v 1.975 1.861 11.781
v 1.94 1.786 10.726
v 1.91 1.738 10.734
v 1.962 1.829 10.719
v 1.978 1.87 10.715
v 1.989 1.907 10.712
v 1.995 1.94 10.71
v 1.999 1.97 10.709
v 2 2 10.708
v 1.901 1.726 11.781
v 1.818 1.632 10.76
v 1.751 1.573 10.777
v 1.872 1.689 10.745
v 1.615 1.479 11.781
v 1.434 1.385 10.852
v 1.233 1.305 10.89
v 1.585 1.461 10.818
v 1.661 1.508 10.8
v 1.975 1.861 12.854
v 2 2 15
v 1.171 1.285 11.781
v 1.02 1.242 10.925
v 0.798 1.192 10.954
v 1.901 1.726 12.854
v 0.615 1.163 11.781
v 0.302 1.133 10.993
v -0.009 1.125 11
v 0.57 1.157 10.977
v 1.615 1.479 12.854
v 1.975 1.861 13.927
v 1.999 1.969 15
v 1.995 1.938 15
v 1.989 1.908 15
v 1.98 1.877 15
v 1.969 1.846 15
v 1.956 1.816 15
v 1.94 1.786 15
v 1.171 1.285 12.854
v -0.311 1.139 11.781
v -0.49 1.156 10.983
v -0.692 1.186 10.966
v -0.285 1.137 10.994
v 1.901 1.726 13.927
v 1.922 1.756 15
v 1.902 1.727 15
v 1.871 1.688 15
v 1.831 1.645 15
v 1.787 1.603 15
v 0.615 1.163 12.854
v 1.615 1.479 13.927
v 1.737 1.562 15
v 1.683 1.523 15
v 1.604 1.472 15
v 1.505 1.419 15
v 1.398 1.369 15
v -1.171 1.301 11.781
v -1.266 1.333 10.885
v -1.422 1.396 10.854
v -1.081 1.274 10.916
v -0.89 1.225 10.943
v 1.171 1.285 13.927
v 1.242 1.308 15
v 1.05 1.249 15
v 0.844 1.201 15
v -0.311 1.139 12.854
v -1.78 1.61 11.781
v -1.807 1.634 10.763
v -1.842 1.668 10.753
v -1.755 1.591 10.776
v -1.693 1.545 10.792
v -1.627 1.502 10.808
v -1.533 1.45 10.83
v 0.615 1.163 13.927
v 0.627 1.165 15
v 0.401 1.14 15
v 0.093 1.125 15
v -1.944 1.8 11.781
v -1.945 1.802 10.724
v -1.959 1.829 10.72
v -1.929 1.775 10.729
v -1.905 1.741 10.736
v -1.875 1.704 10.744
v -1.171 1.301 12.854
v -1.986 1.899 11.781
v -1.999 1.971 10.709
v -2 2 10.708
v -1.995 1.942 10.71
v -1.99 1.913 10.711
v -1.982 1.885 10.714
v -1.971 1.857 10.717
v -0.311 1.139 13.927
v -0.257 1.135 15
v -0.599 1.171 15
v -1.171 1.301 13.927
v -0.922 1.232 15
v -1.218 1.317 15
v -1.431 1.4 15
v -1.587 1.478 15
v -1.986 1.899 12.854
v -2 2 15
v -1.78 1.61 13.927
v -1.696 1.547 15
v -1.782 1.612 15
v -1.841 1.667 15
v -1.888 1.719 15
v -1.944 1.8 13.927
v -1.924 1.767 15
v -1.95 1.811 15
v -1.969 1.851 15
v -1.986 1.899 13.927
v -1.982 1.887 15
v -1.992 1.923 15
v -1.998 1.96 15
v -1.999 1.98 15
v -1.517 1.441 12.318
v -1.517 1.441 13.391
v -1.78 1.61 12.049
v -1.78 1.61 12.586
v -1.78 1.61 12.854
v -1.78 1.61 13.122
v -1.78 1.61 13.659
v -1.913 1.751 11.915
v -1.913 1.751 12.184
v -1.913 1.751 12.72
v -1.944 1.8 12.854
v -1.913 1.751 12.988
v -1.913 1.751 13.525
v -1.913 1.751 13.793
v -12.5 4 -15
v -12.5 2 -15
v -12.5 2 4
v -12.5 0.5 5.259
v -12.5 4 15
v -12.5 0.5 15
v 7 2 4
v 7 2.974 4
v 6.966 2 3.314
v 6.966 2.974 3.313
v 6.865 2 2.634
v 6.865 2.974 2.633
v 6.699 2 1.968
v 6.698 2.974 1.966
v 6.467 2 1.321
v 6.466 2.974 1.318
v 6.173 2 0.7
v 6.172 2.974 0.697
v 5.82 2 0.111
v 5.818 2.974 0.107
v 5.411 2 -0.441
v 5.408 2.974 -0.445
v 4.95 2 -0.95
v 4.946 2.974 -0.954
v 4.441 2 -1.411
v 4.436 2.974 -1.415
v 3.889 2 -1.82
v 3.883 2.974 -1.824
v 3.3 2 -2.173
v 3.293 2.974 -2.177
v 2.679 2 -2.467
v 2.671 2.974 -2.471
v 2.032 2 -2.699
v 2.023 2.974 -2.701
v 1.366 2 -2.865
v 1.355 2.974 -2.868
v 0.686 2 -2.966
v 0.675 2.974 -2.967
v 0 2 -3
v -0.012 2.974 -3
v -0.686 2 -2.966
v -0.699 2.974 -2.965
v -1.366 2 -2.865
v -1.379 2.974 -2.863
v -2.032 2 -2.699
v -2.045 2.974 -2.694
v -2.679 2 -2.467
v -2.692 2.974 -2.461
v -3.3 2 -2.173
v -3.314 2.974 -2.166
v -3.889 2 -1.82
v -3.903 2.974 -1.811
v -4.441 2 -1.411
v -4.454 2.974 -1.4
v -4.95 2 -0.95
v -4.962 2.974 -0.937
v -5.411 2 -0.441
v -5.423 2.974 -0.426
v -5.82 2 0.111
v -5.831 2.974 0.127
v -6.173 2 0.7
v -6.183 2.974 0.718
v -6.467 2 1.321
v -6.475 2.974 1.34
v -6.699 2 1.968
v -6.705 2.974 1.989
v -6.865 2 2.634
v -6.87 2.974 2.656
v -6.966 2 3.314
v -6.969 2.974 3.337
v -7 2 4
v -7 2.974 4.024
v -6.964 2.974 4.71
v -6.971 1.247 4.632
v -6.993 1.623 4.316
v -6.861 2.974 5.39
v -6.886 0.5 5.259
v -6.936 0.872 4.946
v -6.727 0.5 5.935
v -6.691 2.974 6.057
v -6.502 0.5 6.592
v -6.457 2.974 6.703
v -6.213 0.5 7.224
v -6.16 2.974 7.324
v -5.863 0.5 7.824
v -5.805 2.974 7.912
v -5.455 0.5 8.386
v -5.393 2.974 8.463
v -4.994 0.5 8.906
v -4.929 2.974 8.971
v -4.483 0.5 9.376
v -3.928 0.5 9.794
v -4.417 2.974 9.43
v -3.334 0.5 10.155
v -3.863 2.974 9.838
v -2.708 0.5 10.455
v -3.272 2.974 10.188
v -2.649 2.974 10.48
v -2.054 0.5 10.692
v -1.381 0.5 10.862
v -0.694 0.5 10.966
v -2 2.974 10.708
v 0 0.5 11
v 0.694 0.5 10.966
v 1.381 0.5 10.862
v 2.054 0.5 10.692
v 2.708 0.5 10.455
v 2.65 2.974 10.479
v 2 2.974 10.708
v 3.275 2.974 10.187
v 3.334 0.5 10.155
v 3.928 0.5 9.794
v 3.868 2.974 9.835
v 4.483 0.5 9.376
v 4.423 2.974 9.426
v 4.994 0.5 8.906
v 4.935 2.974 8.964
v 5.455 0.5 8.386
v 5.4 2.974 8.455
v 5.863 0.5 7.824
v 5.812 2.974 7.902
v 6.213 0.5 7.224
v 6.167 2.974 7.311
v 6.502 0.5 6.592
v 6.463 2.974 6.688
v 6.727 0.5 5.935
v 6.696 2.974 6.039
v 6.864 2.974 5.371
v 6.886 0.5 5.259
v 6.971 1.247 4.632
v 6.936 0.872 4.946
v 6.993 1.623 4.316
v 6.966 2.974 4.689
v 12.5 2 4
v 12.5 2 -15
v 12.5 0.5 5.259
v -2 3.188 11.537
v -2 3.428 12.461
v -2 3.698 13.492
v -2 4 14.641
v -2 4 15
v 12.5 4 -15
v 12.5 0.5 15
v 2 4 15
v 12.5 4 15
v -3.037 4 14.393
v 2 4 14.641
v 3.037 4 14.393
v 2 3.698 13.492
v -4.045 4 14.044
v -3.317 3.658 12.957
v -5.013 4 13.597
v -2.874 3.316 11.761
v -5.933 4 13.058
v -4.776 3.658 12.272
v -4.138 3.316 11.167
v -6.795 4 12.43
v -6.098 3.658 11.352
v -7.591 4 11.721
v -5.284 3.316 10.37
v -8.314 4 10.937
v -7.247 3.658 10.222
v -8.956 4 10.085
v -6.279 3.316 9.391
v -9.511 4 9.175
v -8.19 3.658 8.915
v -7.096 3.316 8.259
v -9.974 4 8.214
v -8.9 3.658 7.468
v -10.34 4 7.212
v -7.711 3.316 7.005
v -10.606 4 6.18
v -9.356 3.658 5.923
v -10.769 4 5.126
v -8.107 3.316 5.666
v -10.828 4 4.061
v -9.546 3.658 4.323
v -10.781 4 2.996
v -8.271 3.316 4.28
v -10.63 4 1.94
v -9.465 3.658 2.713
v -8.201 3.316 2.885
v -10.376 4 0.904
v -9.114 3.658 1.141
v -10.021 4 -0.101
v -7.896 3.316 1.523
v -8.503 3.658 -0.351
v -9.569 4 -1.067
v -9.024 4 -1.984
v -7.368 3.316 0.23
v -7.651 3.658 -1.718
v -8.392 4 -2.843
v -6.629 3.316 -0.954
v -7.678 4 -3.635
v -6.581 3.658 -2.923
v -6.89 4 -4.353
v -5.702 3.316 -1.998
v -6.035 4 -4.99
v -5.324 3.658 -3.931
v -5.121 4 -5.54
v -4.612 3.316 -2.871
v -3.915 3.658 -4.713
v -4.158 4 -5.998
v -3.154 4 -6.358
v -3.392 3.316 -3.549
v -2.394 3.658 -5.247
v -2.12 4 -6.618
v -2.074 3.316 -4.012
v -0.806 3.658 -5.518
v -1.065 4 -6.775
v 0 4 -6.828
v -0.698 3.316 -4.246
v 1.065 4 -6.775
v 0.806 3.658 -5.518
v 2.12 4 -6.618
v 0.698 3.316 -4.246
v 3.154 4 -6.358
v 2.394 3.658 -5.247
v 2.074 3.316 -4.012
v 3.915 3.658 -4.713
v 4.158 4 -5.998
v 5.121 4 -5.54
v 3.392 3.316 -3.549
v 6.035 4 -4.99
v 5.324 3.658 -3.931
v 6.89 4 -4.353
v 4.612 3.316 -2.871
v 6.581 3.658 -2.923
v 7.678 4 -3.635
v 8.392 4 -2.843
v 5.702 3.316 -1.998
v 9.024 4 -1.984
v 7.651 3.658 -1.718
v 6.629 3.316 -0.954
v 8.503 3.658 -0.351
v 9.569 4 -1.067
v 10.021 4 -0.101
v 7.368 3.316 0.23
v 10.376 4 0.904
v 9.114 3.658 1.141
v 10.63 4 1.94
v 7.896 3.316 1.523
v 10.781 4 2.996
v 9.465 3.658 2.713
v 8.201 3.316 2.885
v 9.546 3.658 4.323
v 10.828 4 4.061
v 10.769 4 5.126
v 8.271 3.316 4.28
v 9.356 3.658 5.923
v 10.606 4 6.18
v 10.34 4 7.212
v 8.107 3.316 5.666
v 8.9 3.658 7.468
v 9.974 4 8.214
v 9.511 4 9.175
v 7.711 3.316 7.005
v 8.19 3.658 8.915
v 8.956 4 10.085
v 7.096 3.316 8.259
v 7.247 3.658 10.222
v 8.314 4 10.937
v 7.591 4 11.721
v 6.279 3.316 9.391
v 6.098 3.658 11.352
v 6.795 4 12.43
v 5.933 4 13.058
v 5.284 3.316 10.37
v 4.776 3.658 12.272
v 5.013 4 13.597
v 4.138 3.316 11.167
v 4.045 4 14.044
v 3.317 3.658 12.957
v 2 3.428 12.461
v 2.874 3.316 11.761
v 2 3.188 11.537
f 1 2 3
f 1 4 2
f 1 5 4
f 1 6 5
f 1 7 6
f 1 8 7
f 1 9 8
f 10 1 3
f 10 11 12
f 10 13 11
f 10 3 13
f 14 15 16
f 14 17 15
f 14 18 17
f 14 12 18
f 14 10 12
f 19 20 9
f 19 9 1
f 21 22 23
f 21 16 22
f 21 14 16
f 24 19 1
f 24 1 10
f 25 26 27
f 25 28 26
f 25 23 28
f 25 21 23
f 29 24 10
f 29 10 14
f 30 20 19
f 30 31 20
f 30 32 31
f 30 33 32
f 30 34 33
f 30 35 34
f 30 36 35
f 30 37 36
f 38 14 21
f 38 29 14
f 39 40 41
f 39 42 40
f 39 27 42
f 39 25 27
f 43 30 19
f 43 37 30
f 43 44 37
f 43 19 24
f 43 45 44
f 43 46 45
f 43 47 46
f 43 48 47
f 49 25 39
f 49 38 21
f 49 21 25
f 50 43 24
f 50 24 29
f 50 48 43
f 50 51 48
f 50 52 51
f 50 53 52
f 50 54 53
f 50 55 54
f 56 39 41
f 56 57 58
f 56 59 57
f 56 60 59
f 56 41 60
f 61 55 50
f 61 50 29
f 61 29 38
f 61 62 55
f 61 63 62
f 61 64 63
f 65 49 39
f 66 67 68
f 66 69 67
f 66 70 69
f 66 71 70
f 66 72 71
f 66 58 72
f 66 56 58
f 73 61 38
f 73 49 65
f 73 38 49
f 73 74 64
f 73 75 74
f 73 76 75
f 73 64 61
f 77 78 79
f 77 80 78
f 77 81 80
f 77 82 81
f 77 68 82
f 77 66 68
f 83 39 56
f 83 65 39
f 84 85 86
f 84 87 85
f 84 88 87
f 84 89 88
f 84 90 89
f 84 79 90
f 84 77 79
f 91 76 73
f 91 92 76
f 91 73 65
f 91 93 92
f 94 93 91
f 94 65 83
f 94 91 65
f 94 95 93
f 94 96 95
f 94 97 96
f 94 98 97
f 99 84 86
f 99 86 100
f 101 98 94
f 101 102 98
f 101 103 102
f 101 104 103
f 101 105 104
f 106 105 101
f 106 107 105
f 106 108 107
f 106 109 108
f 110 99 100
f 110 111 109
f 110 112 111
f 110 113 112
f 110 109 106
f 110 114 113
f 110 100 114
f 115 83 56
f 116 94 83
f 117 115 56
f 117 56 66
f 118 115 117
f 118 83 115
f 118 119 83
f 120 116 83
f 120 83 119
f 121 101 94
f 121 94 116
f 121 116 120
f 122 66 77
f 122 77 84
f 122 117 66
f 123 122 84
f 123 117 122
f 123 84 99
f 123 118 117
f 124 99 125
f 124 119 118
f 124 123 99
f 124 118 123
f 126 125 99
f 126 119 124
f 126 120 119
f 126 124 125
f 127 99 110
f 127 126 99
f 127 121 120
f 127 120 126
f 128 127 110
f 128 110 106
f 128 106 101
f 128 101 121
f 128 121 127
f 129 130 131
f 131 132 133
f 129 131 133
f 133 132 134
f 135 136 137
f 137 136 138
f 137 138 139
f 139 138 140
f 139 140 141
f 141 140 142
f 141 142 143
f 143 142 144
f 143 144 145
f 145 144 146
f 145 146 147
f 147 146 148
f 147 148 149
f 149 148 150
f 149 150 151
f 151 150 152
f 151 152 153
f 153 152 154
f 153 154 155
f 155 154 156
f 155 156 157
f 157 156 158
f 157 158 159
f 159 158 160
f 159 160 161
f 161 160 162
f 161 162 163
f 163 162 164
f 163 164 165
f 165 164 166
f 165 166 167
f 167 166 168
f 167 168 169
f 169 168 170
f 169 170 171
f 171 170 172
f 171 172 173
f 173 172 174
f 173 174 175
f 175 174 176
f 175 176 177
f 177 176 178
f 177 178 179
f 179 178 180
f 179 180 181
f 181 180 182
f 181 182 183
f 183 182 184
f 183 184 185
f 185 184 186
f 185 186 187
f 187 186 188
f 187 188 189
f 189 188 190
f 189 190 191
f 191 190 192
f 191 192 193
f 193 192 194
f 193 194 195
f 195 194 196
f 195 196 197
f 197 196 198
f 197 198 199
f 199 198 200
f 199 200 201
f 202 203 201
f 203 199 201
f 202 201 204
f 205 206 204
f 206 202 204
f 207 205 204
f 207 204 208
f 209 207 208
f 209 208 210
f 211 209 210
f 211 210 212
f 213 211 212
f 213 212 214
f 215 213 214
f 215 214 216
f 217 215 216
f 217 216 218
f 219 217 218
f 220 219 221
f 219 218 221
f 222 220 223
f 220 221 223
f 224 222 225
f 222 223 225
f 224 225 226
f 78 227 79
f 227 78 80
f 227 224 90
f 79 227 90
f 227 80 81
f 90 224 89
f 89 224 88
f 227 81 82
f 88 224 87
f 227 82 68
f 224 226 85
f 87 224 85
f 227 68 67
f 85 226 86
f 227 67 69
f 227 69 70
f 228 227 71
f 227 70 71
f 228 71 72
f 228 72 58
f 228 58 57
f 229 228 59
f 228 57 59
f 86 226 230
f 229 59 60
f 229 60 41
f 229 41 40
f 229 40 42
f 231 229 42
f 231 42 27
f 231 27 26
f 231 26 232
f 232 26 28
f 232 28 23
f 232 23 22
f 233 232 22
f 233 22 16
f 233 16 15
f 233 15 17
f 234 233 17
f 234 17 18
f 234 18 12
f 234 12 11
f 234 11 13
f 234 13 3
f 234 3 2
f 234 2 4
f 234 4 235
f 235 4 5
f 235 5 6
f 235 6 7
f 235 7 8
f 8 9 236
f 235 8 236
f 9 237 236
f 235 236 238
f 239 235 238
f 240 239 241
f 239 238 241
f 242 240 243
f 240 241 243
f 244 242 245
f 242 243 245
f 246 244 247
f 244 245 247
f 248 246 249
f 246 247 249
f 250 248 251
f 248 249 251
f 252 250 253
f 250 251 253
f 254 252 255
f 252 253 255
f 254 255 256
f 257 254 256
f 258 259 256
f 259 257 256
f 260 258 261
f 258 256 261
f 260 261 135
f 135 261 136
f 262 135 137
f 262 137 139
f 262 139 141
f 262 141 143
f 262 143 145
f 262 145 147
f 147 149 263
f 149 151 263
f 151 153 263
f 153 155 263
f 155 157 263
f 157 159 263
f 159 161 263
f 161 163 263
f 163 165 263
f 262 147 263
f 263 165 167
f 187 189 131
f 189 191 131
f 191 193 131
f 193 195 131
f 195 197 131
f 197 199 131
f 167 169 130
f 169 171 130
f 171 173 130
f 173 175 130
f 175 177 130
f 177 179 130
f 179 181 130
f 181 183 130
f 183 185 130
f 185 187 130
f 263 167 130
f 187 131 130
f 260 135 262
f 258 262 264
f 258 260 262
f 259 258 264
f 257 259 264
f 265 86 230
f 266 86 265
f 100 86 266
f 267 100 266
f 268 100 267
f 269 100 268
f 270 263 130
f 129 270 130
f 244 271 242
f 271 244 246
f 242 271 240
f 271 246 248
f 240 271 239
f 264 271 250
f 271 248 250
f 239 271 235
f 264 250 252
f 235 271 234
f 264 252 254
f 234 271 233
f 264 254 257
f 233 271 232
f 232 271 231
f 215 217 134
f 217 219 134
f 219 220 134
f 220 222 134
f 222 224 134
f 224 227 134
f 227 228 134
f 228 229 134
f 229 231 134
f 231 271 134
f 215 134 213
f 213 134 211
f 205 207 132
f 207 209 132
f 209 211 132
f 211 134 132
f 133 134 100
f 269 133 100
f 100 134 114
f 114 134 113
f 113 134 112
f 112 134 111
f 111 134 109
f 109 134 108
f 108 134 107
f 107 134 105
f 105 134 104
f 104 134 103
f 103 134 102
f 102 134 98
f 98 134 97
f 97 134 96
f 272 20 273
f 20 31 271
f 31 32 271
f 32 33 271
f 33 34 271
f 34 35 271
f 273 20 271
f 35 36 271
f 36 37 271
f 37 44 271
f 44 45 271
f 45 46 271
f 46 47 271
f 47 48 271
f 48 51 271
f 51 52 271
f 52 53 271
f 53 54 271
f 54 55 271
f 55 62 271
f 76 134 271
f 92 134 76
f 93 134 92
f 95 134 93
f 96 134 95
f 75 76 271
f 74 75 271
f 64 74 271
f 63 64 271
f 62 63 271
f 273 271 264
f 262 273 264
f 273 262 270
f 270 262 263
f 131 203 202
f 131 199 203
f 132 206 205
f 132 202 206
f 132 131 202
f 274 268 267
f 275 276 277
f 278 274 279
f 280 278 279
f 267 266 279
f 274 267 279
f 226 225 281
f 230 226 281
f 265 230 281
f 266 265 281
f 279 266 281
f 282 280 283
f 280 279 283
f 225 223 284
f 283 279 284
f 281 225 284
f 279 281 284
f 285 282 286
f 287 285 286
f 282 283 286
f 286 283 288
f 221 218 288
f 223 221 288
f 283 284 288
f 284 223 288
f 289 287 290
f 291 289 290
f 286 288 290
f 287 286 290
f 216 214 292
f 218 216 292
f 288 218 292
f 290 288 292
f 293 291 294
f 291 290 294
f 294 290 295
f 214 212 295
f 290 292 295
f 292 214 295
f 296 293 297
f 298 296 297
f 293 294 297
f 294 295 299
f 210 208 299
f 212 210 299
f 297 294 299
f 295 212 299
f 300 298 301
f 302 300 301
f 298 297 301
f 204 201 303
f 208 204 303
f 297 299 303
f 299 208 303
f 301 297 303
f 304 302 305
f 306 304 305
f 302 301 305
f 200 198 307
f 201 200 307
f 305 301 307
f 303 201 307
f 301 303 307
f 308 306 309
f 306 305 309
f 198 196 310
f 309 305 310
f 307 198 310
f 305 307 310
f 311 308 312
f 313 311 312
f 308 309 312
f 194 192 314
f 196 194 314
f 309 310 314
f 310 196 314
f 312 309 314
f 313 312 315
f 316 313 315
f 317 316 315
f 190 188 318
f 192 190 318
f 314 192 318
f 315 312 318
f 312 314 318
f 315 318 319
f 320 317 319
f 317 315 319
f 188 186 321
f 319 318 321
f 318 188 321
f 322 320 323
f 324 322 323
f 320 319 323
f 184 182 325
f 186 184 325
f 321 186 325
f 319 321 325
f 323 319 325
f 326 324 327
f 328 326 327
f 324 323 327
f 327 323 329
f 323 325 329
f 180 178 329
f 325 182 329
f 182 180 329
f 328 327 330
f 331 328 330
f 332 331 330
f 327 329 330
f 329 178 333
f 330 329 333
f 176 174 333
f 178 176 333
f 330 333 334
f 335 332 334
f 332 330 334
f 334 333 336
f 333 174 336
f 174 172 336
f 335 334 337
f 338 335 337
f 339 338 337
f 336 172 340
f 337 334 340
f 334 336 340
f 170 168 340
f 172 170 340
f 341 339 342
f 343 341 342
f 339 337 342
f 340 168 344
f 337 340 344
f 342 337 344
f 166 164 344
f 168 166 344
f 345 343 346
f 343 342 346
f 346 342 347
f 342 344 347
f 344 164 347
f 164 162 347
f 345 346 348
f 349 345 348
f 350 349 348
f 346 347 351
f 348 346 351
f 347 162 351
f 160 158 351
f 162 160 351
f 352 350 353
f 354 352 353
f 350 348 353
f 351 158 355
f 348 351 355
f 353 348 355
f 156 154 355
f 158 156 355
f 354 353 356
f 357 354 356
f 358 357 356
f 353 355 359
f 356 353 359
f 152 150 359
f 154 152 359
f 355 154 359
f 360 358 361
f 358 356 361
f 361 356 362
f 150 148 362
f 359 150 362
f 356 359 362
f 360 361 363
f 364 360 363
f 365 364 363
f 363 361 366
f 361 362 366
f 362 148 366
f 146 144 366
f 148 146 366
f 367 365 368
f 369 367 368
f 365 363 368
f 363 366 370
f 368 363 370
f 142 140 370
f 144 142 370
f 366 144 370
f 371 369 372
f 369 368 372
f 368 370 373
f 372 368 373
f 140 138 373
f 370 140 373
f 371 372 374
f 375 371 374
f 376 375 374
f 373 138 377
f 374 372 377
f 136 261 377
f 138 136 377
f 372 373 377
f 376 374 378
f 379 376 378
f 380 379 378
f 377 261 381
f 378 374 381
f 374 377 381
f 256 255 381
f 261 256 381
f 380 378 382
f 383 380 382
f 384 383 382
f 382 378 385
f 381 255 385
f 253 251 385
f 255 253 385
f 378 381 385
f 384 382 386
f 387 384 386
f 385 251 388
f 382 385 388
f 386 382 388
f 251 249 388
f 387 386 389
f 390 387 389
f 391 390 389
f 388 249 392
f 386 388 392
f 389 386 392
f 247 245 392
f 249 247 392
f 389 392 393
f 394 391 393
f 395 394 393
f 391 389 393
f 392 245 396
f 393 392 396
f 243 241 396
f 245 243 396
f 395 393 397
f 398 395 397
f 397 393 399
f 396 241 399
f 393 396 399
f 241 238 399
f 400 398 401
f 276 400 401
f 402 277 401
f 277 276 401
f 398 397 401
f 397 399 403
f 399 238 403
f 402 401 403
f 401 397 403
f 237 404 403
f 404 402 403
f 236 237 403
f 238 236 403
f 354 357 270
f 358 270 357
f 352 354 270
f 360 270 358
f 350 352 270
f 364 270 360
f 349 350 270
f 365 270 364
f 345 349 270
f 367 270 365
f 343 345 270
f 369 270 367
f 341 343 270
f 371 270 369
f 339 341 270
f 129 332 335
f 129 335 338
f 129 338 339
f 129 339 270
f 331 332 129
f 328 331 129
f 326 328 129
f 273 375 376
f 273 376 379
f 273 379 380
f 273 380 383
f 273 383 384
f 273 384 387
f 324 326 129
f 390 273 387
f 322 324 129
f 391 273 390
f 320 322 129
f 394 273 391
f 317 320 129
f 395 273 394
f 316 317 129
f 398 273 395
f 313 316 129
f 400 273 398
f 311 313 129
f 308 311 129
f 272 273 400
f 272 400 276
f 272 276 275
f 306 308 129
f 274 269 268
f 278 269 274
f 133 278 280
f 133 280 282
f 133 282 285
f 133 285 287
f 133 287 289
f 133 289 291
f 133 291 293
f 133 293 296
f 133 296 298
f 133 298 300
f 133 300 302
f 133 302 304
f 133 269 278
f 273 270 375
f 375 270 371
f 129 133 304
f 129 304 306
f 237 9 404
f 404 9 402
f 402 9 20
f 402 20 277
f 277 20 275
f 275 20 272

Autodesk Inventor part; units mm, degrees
ref_plane "YZ Plane" through (0, 0, 0) normal (1, 0, 0) x (0, 1, 0)
ref_plane "XZ Plane" through (0, 0, 0) normal (0, 1, 0) x (-1, 0, 0)
ref_plane "XY Plane" through (0, 0, 0) normal (0, 0, 1) x (1, 0, 0)
sketch "Sketch1" plane through (0, 0, 0) normal (0, 1, 0) x (-1, 0, 0)
  line L0 (12.5, 15) -> (-12.5, 15)
  line L1 (-12.5, 15) -> (-12.5, -15)
  line L2 (-12.5, -15) -> (12.5, -15)
  line L3 (12.5, -15) -> (12.5, 15)
  line L4 (12.5, 15) -> (-12.5, -15) construction
  line L5 (-12.5, 15) -> (12.5, -15) construction
  point P0 (0, 0)
  dimension "d0" = 25
  dimension "d1" = 30
extrude "Extrusion1" add sketch "Sketch1" along normal blind 4
sketch "Sketch2" plane through (0, 4, 0) normal (0, 1, 0) x (1, 0, 0)
  line L0 (-12.5, 15) -> (-12.5, -15) construction
  line L1 (-12.5, -11) -> (12.5, -11) construction
  line L2 (12.5, -15) -> (12.5, 15) construction
  line L3 (-12.5, -15) -> (12.5, -15) construction
  circle A0 centre (0, -4) radius 7
  line L4 (0, -15) -> (0, 15) construction
  line L5 (12.5, 15) -> (-12.5, 15) construction
  point P0 (0, 0)
  point P1 (0, -11)
  dimension "d5" = 14
  dimension "d4" = 4
extrude "Extrusion2" cut sketch "Sketch2" against normal through all
sketch "Sketch3" plane through (0, 0, 0) normal (1, 0, 0) x (0, 1, 0)
  line L0 (4, -3) -> (4, 11) construction
  line L1 (0, -15) -> (0, 15) construction
  line L2 (0, 15) -> (4, 15) construction
  line L3 (4, -15) -> (4, 15) construction
  line L4 (0, -15) -> (4, -15) construction
  line L5 (4, 4) -> (0, 4) construction
  line L6 (2, 4) -> (0.5, 5.258649)
  line L7 (2, 4) -> (2, -15)
  line L8 (0, -15) -> (4, -15)
  line L9 (2, -15) -> (1.618278, -15)
  line L10 (0.5, 15) -> (0.5, 5.258649)
  line L11 (1.618278, -15) -> (0, -15)
  line L12 (0, -15) -> (0, 15)
  line L13 (0, 15) -> (0.5, 15)
  line L14 (0, 15) -> (4, 15)
  line L15 (4, 11) -> (0, 11)
  line L16 (4, -3) -> (0, -3)
  point P0 (0, 0)
  dimension "d6" = 50
  dimension "d7" = 2
  dimension "d8" = 1.5
extrude "Extrusion3" cut sketch "Sketch3" along normal through all both and the other way through all
sketch "Sketch7" plane through (-12.5, 4, 15) normal (0, 0, 1) x (1, 0, 0)
  line L0 (0, -3.5) -> (25, -3.5) construction
  line L1 (25, -3.5) -> (25, 0) construction
  line L2 (0, 0) -> (25, 0) construction
  line L3 (0, -3.5) -> (0, 0) construction
  line L4 (5.5, -2) -> (19.5, -2) construction
  circle A0 centre (12.5, -2) radius 0.875 construction
  line L5 (12.5, -2) -> (14.5, -2) construction
  line L6 (12.5, 0) -> (12.5, -3.5) construction
  line L7 (12.5, -2) -> (10.5, -2) construction
  spline S0 degree 5 poles (10.5, -2) (10.5, -1.67732) (11.1, -1.13952) (13.34, -0.733036) (15.98, -2) (13.34, -3.266964) (11.1, -2.86048) (10.5, -2.32268) (10.5, -2) knots 0 0 0 0 0 0 0.3 0.5 0.7 1 1 1 1 1 1
  line L8 (10.5, -2) -> (10.5, 0)
  line L9 (14.5, -2) -> (14.5, 0)
  line L10 (10.5, 0) -> (14.5, 0)
  point P0 (12.5, -4)
  point P1 (12.5, -2.875)
  dimension "d26" = 1.75
  dimension "d27" = 2
  dimension "d28" = 2
extrude "Extrusion4" cut sketch "Sketch7" against normal blind 10.25
sketch "Sketch4" plane through (0, 0, 0) normal (1, 0, 0) x (0, 1, 0)
  line L0 (2, -15) -> (2, 4)
  line L1 (2, 4) -> (0.5, 5.258649)
  line L2 (0.5, 5.258649) -> (0.5, 15)
  line L3 (0.5, 15) -> (4, 15)
  line L4 (4, -15) -> (4, 15)
  line L5 (2, -15) -> (4, -15)
  line L6 (4, 11) -> (4, -3)
  line L7 (2, 4) -> (2, -15)
  line L8 (4, 4) -> (0, 4)
  line L9 (4, -15) -> (4, 15)
  line L10 (2, 4.5) -> (2, 3.5)
  line L11 (2.965926, 4.758819) -> (1.034074, 4.241181)
  line L12 (1.034074, 4.241181) -> (6.725631, -17)
  line L13 (6.725631, -17) -> (8.657483, -16.482362)
  line L14 (8.657483, -16.482362) -> (3.169251, 4)
  line L15 (3.169251, 4) -> (1.098698, 4)
  point P0 (0, 0)
  point P1 (2, 4)
  dimension "d13" = 0.5
  dimension "d18" = 15
  dimension "d19" = 2
  dimension "d20" = 2
revolve "Revolution2" cut sketch "Sketch4" angle 360 about axis through (0, 4, 4) along (0, -1, 0) contours L0 L12 L8 | L0 L8 L14 L4 L12 | L4 L14 L13 L12
properties part number "wide_access_platform_v01_ok"
